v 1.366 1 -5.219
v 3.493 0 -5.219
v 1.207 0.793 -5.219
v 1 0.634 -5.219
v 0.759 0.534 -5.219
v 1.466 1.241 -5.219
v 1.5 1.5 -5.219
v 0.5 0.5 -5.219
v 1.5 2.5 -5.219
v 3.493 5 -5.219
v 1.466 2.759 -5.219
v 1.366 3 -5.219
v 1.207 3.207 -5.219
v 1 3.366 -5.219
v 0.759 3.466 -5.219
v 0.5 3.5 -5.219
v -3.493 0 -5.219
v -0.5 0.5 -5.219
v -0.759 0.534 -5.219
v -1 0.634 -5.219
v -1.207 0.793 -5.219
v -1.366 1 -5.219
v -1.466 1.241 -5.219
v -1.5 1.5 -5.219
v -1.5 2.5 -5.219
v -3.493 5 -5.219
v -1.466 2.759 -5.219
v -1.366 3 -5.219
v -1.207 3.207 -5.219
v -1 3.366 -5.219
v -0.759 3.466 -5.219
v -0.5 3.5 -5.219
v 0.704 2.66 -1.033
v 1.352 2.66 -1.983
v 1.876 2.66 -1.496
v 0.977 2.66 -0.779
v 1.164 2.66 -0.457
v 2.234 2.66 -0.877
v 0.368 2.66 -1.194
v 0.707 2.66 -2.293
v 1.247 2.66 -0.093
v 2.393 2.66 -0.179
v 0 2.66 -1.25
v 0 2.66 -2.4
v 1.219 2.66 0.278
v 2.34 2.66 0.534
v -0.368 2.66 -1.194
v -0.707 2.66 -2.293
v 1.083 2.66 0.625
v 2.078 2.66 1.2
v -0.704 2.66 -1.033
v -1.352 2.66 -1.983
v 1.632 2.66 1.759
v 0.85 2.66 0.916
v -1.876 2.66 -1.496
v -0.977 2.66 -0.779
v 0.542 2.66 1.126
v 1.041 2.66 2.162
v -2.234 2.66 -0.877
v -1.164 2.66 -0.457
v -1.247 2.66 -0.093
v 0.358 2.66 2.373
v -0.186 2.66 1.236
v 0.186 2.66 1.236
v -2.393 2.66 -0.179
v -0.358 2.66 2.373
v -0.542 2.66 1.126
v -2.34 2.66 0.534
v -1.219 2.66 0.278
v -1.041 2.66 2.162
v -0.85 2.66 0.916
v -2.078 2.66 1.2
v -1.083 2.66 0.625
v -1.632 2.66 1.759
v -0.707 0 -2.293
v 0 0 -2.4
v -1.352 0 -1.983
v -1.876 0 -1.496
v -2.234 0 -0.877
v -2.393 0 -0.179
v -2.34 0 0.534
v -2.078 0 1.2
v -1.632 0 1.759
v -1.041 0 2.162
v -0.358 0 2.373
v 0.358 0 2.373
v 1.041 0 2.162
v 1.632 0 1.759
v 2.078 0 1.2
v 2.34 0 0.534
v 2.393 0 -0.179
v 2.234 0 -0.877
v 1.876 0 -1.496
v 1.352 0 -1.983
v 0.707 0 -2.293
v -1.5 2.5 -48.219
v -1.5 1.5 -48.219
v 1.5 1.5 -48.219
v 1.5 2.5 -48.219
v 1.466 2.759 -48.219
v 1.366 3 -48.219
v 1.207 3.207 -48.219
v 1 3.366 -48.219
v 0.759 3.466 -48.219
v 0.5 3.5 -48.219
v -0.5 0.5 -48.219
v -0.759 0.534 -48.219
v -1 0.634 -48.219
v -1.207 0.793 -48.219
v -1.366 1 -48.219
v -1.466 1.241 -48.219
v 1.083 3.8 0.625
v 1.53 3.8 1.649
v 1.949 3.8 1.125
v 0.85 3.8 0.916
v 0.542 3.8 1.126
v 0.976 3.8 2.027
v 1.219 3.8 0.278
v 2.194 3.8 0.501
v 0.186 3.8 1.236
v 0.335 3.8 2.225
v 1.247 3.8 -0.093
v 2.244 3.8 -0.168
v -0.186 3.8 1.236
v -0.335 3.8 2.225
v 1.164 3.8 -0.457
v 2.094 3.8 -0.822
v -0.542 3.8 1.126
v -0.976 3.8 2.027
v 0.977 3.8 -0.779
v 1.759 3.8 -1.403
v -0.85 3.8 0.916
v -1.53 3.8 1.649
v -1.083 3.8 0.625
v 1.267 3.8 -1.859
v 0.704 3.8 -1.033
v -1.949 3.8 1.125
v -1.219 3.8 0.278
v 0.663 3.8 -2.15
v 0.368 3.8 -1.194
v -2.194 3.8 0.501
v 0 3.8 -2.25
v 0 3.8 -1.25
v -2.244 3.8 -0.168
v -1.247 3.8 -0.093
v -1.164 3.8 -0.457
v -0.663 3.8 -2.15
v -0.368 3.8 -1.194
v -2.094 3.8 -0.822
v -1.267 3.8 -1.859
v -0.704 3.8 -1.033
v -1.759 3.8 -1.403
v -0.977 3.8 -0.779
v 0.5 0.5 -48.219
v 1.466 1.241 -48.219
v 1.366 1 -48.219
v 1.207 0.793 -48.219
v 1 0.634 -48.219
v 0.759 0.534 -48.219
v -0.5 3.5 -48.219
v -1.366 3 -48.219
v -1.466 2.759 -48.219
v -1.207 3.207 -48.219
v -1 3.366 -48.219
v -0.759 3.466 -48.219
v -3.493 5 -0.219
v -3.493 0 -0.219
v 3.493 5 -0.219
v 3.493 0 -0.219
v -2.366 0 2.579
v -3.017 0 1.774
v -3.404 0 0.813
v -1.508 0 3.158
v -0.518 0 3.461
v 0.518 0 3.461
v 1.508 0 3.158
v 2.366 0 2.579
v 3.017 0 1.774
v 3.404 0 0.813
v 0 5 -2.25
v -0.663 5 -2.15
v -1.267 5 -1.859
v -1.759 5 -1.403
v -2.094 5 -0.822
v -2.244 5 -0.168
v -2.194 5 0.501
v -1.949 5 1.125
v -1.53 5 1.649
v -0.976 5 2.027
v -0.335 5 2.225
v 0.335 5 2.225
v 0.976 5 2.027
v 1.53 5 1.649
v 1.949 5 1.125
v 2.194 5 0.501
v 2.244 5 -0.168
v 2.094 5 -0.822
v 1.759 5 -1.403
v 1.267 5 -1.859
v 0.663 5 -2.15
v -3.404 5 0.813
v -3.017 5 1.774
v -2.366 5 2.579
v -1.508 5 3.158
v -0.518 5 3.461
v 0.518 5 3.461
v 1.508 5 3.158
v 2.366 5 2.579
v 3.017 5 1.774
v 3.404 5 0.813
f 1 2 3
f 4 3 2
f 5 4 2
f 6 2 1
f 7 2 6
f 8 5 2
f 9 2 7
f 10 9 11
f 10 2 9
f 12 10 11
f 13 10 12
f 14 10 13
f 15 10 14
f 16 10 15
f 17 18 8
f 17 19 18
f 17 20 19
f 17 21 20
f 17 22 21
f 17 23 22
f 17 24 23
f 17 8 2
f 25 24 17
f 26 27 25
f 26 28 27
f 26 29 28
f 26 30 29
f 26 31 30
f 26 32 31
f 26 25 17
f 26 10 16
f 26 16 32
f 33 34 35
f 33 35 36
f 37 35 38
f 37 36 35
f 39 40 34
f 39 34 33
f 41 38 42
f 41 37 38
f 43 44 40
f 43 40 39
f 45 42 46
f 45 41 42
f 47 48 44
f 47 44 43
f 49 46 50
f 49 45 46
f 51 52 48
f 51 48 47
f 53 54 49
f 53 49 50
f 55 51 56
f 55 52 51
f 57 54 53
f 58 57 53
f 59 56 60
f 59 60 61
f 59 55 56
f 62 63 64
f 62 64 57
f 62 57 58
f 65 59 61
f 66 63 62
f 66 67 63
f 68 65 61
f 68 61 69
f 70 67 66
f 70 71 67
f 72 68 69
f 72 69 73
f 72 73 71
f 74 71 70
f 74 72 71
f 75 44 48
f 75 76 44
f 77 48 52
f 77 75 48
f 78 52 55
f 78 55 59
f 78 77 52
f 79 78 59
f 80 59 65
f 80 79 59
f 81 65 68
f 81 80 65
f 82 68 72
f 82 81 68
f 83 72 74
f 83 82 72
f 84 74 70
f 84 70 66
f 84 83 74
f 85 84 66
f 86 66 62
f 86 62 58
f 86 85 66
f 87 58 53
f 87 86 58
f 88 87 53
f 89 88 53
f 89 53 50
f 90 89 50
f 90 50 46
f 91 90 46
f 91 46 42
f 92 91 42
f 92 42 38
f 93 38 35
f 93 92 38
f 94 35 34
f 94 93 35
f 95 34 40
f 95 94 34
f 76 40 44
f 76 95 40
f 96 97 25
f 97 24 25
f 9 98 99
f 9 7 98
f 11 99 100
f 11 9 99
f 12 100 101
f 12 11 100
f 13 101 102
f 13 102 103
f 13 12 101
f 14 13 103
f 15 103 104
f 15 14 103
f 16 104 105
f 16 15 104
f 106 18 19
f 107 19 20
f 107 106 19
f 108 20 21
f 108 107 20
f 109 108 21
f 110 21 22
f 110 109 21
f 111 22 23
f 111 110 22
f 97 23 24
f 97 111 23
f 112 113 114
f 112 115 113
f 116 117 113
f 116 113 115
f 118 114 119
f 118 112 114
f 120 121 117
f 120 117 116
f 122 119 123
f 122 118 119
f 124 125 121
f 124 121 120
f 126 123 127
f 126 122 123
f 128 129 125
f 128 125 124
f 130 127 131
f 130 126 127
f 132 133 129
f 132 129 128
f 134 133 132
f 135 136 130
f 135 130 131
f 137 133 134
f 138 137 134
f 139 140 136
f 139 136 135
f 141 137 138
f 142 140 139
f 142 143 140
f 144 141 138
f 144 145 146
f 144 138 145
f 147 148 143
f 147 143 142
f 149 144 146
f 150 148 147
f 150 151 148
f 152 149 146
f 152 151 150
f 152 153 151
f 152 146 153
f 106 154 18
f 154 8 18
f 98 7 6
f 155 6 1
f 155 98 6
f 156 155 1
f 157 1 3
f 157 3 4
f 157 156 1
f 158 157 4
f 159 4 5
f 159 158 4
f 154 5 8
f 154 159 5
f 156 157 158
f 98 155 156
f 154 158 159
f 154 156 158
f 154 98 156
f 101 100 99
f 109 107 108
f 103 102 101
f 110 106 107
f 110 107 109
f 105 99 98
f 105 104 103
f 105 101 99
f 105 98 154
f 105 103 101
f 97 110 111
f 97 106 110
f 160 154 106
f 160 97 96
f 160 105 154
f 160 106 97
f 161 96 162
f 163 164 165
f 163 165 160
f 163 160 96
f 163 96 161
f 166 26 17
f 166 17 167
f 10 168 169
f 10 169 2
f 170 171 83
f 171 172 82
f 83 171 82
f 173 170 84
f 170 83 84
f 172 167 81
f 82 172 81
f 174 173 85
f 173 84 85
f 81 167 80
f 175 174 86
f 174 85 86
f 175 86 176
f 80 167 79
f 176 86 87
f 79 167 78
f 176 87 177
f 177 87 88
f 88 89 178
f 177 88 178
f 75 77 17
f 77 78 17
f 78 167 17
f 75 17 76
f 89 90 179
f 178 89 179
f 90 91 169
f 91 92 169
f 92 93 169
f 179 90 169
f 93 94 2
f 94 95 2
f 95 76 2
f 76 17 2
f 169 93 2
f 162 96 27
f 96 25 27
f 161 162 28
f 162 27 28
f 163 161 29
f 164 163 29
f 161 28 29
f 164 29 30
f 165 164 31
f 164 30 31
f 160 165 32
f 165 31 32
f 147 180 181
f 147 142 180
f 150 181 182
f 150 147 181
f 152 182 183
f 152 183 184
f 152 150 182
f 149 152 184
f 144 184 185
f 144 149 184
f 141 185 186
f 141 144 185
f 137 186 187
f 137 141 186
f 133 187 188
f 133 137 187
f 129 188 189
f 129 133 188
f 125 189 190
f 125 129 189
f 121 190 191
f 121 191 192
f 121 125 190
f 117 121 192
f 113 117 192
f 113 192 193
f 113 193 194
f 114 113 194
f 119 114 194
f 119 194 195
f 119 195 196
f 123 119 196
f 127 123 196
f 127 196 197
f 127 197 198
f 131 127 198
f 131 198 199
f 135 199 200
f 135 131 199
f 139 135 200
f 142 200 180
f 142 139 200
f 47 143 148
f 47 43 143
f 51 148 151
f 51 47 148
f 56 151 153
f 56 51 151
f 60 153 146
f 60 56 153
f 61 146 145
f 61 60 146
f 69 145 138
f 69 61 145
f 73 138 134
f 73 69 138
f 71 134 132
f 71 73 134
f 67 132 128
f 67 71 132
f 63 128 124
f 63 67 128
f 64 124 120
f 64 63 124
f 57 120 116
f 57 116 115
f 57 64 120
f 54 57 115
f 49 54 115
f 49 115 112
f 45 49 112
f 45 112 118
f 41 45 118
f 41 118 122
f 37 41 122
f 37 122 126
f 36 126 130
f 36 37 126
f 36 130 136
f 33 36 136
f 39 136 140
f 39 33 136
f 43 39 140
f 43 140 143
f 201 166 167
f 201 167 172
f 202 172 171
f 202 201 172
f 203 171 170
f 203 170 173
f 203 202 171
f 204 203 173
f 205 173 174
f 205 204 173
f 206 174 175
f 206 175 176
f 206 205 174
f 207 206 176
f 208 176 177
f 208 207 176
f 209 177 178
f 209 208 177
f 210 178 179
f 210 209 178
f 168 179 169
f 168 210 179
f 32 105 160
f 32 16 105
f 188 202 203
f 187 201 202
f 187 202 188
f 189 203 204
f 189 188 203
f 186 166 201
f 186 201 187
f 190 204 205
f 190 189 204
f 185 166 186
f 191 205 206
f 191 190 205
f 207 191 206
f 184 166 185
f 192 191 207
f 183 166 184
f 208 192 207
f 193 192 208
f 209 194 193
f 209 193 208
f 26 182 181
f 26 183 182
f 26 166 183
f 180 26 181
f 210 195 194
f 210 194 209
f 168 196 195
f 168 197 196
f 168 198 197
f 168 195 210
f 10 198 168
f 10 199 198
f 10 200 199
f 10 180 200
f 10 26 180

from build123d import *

# Parameters (mm, degrees)
EXTRUDE_1_DEPTH = 2
EXTRUDE_START   = -3
EXTRUDE_2_DEPTH = 3
SKETCH_4_W      = 3
SKETCH_4_H      = 3
EXTRUDE_3_DEPTH = 40
SKETCH_6_W      = 3
SKETCH_6_H      = 3
EXTRUDE_4_DEPTH = 3
FILLET_1_R      = 1


with BuildPart() as part:
    # 草图1 → 旋转1 (revolve)
    with BuildSketch(Plane.XY, mode=Mode.PRIVATE) as revolve_1_sk:
        Polygon((-2.4, 0), (-3.5, 0), (-3.5, 5), (-2.25, 5), (-2.25, 3.8), (-1.25, 3.8), (-1.25, 2.66), (-2.4, 2.66), align=None)
    revolve(revolve_1_sk.sketch.rotate(Axis((0, 0, 0), (0, 1, 0)), 270), axis=Axis((0, 0, 0), (0, 1, 0)))

    # 草图2 → 凸台-拉伸1 (add)
    with BuildSketch(Plane(origin=(0, 2, 0), x_dir=(-1, 0, 0), z_dir=(0, -1, 0))):
        with BuildLine():
            Line((-3.493157374, 0.21875), (-3.493157374, 5.21875))
            Line((-3.493157374, 5.21875), (3.493157374, 5.21875))
            Line((3.493157374, 5.21875), (3.493157374, 0.21875))
            ThreePointArc((3.493157374, 0.21875), (0, 3.5), (-3.493157374, 0.21875))
        make_face()
    extrude(amount=EXTRUDE_1_DEPTH)

    # 草图2<2> → 凸台-拉伸2 (add)
    with BuildSketch(Plane(origin=(0, 2, 0), x_dir=(-1, 0, 0), z_dir=(0, -1, 0)).offset(EXTRUDE_START)):
        with BuildLine():
            Line((-3.493157374, 0.21875), (-3.493157374, 5.21875))
            Line((-3.493157374, 5.21875), (3.493157374, 5.21875))
            Line((3.493157374, 5.21875), (3.493157374, 0.21875))
            ThreePointArc((3.493157374, 0.21875), (0, 3.5), (-3.493157374, 0.21875))
        make_face()
    extrude(amount=EXTRUDE_2_DEPTH)

    # 草图4 → 凸台-拉伸3 (add)
    with BuildSketch(Plane(origin=(0, 0, -5.21875), x_dir=(-1, 0, 0), z_dir=(0, 0, -1))):
        with Locations((0, 2)):
            Rectangle(SKETCH_4_W, SKETCH_4_H)
    extrude(amount=EXTRUDE_3_DEPTH)

    # 草图6 → 凸台-拉伸4 (add)
    with BuildSketch(Plane(origin=(0, 0, -45.21875), x_dir=(-1, 0, 0), z_dir=(0, 0, -1))):
        with Locations((0, 2)):
            Rectangle(SKETCH_6_W, SKETCH_6_H)
    extrude(amount=EXTRUDE_4_DEPTH)

    # 圆角1
    fillet_1_edges = [part.edges().sort_by_distance(p)[0] for p in [
        (-1.5, 0.5, -26.71875),
        (-1.5, 3.5, -26.71875),
        (1.5, 3.5, -26.71875),
        (1.5, 0.5, -26.71875),
    ]]
    fillet(fillet_1_edges, radius=FILLET_1_R)


solid = part.part
